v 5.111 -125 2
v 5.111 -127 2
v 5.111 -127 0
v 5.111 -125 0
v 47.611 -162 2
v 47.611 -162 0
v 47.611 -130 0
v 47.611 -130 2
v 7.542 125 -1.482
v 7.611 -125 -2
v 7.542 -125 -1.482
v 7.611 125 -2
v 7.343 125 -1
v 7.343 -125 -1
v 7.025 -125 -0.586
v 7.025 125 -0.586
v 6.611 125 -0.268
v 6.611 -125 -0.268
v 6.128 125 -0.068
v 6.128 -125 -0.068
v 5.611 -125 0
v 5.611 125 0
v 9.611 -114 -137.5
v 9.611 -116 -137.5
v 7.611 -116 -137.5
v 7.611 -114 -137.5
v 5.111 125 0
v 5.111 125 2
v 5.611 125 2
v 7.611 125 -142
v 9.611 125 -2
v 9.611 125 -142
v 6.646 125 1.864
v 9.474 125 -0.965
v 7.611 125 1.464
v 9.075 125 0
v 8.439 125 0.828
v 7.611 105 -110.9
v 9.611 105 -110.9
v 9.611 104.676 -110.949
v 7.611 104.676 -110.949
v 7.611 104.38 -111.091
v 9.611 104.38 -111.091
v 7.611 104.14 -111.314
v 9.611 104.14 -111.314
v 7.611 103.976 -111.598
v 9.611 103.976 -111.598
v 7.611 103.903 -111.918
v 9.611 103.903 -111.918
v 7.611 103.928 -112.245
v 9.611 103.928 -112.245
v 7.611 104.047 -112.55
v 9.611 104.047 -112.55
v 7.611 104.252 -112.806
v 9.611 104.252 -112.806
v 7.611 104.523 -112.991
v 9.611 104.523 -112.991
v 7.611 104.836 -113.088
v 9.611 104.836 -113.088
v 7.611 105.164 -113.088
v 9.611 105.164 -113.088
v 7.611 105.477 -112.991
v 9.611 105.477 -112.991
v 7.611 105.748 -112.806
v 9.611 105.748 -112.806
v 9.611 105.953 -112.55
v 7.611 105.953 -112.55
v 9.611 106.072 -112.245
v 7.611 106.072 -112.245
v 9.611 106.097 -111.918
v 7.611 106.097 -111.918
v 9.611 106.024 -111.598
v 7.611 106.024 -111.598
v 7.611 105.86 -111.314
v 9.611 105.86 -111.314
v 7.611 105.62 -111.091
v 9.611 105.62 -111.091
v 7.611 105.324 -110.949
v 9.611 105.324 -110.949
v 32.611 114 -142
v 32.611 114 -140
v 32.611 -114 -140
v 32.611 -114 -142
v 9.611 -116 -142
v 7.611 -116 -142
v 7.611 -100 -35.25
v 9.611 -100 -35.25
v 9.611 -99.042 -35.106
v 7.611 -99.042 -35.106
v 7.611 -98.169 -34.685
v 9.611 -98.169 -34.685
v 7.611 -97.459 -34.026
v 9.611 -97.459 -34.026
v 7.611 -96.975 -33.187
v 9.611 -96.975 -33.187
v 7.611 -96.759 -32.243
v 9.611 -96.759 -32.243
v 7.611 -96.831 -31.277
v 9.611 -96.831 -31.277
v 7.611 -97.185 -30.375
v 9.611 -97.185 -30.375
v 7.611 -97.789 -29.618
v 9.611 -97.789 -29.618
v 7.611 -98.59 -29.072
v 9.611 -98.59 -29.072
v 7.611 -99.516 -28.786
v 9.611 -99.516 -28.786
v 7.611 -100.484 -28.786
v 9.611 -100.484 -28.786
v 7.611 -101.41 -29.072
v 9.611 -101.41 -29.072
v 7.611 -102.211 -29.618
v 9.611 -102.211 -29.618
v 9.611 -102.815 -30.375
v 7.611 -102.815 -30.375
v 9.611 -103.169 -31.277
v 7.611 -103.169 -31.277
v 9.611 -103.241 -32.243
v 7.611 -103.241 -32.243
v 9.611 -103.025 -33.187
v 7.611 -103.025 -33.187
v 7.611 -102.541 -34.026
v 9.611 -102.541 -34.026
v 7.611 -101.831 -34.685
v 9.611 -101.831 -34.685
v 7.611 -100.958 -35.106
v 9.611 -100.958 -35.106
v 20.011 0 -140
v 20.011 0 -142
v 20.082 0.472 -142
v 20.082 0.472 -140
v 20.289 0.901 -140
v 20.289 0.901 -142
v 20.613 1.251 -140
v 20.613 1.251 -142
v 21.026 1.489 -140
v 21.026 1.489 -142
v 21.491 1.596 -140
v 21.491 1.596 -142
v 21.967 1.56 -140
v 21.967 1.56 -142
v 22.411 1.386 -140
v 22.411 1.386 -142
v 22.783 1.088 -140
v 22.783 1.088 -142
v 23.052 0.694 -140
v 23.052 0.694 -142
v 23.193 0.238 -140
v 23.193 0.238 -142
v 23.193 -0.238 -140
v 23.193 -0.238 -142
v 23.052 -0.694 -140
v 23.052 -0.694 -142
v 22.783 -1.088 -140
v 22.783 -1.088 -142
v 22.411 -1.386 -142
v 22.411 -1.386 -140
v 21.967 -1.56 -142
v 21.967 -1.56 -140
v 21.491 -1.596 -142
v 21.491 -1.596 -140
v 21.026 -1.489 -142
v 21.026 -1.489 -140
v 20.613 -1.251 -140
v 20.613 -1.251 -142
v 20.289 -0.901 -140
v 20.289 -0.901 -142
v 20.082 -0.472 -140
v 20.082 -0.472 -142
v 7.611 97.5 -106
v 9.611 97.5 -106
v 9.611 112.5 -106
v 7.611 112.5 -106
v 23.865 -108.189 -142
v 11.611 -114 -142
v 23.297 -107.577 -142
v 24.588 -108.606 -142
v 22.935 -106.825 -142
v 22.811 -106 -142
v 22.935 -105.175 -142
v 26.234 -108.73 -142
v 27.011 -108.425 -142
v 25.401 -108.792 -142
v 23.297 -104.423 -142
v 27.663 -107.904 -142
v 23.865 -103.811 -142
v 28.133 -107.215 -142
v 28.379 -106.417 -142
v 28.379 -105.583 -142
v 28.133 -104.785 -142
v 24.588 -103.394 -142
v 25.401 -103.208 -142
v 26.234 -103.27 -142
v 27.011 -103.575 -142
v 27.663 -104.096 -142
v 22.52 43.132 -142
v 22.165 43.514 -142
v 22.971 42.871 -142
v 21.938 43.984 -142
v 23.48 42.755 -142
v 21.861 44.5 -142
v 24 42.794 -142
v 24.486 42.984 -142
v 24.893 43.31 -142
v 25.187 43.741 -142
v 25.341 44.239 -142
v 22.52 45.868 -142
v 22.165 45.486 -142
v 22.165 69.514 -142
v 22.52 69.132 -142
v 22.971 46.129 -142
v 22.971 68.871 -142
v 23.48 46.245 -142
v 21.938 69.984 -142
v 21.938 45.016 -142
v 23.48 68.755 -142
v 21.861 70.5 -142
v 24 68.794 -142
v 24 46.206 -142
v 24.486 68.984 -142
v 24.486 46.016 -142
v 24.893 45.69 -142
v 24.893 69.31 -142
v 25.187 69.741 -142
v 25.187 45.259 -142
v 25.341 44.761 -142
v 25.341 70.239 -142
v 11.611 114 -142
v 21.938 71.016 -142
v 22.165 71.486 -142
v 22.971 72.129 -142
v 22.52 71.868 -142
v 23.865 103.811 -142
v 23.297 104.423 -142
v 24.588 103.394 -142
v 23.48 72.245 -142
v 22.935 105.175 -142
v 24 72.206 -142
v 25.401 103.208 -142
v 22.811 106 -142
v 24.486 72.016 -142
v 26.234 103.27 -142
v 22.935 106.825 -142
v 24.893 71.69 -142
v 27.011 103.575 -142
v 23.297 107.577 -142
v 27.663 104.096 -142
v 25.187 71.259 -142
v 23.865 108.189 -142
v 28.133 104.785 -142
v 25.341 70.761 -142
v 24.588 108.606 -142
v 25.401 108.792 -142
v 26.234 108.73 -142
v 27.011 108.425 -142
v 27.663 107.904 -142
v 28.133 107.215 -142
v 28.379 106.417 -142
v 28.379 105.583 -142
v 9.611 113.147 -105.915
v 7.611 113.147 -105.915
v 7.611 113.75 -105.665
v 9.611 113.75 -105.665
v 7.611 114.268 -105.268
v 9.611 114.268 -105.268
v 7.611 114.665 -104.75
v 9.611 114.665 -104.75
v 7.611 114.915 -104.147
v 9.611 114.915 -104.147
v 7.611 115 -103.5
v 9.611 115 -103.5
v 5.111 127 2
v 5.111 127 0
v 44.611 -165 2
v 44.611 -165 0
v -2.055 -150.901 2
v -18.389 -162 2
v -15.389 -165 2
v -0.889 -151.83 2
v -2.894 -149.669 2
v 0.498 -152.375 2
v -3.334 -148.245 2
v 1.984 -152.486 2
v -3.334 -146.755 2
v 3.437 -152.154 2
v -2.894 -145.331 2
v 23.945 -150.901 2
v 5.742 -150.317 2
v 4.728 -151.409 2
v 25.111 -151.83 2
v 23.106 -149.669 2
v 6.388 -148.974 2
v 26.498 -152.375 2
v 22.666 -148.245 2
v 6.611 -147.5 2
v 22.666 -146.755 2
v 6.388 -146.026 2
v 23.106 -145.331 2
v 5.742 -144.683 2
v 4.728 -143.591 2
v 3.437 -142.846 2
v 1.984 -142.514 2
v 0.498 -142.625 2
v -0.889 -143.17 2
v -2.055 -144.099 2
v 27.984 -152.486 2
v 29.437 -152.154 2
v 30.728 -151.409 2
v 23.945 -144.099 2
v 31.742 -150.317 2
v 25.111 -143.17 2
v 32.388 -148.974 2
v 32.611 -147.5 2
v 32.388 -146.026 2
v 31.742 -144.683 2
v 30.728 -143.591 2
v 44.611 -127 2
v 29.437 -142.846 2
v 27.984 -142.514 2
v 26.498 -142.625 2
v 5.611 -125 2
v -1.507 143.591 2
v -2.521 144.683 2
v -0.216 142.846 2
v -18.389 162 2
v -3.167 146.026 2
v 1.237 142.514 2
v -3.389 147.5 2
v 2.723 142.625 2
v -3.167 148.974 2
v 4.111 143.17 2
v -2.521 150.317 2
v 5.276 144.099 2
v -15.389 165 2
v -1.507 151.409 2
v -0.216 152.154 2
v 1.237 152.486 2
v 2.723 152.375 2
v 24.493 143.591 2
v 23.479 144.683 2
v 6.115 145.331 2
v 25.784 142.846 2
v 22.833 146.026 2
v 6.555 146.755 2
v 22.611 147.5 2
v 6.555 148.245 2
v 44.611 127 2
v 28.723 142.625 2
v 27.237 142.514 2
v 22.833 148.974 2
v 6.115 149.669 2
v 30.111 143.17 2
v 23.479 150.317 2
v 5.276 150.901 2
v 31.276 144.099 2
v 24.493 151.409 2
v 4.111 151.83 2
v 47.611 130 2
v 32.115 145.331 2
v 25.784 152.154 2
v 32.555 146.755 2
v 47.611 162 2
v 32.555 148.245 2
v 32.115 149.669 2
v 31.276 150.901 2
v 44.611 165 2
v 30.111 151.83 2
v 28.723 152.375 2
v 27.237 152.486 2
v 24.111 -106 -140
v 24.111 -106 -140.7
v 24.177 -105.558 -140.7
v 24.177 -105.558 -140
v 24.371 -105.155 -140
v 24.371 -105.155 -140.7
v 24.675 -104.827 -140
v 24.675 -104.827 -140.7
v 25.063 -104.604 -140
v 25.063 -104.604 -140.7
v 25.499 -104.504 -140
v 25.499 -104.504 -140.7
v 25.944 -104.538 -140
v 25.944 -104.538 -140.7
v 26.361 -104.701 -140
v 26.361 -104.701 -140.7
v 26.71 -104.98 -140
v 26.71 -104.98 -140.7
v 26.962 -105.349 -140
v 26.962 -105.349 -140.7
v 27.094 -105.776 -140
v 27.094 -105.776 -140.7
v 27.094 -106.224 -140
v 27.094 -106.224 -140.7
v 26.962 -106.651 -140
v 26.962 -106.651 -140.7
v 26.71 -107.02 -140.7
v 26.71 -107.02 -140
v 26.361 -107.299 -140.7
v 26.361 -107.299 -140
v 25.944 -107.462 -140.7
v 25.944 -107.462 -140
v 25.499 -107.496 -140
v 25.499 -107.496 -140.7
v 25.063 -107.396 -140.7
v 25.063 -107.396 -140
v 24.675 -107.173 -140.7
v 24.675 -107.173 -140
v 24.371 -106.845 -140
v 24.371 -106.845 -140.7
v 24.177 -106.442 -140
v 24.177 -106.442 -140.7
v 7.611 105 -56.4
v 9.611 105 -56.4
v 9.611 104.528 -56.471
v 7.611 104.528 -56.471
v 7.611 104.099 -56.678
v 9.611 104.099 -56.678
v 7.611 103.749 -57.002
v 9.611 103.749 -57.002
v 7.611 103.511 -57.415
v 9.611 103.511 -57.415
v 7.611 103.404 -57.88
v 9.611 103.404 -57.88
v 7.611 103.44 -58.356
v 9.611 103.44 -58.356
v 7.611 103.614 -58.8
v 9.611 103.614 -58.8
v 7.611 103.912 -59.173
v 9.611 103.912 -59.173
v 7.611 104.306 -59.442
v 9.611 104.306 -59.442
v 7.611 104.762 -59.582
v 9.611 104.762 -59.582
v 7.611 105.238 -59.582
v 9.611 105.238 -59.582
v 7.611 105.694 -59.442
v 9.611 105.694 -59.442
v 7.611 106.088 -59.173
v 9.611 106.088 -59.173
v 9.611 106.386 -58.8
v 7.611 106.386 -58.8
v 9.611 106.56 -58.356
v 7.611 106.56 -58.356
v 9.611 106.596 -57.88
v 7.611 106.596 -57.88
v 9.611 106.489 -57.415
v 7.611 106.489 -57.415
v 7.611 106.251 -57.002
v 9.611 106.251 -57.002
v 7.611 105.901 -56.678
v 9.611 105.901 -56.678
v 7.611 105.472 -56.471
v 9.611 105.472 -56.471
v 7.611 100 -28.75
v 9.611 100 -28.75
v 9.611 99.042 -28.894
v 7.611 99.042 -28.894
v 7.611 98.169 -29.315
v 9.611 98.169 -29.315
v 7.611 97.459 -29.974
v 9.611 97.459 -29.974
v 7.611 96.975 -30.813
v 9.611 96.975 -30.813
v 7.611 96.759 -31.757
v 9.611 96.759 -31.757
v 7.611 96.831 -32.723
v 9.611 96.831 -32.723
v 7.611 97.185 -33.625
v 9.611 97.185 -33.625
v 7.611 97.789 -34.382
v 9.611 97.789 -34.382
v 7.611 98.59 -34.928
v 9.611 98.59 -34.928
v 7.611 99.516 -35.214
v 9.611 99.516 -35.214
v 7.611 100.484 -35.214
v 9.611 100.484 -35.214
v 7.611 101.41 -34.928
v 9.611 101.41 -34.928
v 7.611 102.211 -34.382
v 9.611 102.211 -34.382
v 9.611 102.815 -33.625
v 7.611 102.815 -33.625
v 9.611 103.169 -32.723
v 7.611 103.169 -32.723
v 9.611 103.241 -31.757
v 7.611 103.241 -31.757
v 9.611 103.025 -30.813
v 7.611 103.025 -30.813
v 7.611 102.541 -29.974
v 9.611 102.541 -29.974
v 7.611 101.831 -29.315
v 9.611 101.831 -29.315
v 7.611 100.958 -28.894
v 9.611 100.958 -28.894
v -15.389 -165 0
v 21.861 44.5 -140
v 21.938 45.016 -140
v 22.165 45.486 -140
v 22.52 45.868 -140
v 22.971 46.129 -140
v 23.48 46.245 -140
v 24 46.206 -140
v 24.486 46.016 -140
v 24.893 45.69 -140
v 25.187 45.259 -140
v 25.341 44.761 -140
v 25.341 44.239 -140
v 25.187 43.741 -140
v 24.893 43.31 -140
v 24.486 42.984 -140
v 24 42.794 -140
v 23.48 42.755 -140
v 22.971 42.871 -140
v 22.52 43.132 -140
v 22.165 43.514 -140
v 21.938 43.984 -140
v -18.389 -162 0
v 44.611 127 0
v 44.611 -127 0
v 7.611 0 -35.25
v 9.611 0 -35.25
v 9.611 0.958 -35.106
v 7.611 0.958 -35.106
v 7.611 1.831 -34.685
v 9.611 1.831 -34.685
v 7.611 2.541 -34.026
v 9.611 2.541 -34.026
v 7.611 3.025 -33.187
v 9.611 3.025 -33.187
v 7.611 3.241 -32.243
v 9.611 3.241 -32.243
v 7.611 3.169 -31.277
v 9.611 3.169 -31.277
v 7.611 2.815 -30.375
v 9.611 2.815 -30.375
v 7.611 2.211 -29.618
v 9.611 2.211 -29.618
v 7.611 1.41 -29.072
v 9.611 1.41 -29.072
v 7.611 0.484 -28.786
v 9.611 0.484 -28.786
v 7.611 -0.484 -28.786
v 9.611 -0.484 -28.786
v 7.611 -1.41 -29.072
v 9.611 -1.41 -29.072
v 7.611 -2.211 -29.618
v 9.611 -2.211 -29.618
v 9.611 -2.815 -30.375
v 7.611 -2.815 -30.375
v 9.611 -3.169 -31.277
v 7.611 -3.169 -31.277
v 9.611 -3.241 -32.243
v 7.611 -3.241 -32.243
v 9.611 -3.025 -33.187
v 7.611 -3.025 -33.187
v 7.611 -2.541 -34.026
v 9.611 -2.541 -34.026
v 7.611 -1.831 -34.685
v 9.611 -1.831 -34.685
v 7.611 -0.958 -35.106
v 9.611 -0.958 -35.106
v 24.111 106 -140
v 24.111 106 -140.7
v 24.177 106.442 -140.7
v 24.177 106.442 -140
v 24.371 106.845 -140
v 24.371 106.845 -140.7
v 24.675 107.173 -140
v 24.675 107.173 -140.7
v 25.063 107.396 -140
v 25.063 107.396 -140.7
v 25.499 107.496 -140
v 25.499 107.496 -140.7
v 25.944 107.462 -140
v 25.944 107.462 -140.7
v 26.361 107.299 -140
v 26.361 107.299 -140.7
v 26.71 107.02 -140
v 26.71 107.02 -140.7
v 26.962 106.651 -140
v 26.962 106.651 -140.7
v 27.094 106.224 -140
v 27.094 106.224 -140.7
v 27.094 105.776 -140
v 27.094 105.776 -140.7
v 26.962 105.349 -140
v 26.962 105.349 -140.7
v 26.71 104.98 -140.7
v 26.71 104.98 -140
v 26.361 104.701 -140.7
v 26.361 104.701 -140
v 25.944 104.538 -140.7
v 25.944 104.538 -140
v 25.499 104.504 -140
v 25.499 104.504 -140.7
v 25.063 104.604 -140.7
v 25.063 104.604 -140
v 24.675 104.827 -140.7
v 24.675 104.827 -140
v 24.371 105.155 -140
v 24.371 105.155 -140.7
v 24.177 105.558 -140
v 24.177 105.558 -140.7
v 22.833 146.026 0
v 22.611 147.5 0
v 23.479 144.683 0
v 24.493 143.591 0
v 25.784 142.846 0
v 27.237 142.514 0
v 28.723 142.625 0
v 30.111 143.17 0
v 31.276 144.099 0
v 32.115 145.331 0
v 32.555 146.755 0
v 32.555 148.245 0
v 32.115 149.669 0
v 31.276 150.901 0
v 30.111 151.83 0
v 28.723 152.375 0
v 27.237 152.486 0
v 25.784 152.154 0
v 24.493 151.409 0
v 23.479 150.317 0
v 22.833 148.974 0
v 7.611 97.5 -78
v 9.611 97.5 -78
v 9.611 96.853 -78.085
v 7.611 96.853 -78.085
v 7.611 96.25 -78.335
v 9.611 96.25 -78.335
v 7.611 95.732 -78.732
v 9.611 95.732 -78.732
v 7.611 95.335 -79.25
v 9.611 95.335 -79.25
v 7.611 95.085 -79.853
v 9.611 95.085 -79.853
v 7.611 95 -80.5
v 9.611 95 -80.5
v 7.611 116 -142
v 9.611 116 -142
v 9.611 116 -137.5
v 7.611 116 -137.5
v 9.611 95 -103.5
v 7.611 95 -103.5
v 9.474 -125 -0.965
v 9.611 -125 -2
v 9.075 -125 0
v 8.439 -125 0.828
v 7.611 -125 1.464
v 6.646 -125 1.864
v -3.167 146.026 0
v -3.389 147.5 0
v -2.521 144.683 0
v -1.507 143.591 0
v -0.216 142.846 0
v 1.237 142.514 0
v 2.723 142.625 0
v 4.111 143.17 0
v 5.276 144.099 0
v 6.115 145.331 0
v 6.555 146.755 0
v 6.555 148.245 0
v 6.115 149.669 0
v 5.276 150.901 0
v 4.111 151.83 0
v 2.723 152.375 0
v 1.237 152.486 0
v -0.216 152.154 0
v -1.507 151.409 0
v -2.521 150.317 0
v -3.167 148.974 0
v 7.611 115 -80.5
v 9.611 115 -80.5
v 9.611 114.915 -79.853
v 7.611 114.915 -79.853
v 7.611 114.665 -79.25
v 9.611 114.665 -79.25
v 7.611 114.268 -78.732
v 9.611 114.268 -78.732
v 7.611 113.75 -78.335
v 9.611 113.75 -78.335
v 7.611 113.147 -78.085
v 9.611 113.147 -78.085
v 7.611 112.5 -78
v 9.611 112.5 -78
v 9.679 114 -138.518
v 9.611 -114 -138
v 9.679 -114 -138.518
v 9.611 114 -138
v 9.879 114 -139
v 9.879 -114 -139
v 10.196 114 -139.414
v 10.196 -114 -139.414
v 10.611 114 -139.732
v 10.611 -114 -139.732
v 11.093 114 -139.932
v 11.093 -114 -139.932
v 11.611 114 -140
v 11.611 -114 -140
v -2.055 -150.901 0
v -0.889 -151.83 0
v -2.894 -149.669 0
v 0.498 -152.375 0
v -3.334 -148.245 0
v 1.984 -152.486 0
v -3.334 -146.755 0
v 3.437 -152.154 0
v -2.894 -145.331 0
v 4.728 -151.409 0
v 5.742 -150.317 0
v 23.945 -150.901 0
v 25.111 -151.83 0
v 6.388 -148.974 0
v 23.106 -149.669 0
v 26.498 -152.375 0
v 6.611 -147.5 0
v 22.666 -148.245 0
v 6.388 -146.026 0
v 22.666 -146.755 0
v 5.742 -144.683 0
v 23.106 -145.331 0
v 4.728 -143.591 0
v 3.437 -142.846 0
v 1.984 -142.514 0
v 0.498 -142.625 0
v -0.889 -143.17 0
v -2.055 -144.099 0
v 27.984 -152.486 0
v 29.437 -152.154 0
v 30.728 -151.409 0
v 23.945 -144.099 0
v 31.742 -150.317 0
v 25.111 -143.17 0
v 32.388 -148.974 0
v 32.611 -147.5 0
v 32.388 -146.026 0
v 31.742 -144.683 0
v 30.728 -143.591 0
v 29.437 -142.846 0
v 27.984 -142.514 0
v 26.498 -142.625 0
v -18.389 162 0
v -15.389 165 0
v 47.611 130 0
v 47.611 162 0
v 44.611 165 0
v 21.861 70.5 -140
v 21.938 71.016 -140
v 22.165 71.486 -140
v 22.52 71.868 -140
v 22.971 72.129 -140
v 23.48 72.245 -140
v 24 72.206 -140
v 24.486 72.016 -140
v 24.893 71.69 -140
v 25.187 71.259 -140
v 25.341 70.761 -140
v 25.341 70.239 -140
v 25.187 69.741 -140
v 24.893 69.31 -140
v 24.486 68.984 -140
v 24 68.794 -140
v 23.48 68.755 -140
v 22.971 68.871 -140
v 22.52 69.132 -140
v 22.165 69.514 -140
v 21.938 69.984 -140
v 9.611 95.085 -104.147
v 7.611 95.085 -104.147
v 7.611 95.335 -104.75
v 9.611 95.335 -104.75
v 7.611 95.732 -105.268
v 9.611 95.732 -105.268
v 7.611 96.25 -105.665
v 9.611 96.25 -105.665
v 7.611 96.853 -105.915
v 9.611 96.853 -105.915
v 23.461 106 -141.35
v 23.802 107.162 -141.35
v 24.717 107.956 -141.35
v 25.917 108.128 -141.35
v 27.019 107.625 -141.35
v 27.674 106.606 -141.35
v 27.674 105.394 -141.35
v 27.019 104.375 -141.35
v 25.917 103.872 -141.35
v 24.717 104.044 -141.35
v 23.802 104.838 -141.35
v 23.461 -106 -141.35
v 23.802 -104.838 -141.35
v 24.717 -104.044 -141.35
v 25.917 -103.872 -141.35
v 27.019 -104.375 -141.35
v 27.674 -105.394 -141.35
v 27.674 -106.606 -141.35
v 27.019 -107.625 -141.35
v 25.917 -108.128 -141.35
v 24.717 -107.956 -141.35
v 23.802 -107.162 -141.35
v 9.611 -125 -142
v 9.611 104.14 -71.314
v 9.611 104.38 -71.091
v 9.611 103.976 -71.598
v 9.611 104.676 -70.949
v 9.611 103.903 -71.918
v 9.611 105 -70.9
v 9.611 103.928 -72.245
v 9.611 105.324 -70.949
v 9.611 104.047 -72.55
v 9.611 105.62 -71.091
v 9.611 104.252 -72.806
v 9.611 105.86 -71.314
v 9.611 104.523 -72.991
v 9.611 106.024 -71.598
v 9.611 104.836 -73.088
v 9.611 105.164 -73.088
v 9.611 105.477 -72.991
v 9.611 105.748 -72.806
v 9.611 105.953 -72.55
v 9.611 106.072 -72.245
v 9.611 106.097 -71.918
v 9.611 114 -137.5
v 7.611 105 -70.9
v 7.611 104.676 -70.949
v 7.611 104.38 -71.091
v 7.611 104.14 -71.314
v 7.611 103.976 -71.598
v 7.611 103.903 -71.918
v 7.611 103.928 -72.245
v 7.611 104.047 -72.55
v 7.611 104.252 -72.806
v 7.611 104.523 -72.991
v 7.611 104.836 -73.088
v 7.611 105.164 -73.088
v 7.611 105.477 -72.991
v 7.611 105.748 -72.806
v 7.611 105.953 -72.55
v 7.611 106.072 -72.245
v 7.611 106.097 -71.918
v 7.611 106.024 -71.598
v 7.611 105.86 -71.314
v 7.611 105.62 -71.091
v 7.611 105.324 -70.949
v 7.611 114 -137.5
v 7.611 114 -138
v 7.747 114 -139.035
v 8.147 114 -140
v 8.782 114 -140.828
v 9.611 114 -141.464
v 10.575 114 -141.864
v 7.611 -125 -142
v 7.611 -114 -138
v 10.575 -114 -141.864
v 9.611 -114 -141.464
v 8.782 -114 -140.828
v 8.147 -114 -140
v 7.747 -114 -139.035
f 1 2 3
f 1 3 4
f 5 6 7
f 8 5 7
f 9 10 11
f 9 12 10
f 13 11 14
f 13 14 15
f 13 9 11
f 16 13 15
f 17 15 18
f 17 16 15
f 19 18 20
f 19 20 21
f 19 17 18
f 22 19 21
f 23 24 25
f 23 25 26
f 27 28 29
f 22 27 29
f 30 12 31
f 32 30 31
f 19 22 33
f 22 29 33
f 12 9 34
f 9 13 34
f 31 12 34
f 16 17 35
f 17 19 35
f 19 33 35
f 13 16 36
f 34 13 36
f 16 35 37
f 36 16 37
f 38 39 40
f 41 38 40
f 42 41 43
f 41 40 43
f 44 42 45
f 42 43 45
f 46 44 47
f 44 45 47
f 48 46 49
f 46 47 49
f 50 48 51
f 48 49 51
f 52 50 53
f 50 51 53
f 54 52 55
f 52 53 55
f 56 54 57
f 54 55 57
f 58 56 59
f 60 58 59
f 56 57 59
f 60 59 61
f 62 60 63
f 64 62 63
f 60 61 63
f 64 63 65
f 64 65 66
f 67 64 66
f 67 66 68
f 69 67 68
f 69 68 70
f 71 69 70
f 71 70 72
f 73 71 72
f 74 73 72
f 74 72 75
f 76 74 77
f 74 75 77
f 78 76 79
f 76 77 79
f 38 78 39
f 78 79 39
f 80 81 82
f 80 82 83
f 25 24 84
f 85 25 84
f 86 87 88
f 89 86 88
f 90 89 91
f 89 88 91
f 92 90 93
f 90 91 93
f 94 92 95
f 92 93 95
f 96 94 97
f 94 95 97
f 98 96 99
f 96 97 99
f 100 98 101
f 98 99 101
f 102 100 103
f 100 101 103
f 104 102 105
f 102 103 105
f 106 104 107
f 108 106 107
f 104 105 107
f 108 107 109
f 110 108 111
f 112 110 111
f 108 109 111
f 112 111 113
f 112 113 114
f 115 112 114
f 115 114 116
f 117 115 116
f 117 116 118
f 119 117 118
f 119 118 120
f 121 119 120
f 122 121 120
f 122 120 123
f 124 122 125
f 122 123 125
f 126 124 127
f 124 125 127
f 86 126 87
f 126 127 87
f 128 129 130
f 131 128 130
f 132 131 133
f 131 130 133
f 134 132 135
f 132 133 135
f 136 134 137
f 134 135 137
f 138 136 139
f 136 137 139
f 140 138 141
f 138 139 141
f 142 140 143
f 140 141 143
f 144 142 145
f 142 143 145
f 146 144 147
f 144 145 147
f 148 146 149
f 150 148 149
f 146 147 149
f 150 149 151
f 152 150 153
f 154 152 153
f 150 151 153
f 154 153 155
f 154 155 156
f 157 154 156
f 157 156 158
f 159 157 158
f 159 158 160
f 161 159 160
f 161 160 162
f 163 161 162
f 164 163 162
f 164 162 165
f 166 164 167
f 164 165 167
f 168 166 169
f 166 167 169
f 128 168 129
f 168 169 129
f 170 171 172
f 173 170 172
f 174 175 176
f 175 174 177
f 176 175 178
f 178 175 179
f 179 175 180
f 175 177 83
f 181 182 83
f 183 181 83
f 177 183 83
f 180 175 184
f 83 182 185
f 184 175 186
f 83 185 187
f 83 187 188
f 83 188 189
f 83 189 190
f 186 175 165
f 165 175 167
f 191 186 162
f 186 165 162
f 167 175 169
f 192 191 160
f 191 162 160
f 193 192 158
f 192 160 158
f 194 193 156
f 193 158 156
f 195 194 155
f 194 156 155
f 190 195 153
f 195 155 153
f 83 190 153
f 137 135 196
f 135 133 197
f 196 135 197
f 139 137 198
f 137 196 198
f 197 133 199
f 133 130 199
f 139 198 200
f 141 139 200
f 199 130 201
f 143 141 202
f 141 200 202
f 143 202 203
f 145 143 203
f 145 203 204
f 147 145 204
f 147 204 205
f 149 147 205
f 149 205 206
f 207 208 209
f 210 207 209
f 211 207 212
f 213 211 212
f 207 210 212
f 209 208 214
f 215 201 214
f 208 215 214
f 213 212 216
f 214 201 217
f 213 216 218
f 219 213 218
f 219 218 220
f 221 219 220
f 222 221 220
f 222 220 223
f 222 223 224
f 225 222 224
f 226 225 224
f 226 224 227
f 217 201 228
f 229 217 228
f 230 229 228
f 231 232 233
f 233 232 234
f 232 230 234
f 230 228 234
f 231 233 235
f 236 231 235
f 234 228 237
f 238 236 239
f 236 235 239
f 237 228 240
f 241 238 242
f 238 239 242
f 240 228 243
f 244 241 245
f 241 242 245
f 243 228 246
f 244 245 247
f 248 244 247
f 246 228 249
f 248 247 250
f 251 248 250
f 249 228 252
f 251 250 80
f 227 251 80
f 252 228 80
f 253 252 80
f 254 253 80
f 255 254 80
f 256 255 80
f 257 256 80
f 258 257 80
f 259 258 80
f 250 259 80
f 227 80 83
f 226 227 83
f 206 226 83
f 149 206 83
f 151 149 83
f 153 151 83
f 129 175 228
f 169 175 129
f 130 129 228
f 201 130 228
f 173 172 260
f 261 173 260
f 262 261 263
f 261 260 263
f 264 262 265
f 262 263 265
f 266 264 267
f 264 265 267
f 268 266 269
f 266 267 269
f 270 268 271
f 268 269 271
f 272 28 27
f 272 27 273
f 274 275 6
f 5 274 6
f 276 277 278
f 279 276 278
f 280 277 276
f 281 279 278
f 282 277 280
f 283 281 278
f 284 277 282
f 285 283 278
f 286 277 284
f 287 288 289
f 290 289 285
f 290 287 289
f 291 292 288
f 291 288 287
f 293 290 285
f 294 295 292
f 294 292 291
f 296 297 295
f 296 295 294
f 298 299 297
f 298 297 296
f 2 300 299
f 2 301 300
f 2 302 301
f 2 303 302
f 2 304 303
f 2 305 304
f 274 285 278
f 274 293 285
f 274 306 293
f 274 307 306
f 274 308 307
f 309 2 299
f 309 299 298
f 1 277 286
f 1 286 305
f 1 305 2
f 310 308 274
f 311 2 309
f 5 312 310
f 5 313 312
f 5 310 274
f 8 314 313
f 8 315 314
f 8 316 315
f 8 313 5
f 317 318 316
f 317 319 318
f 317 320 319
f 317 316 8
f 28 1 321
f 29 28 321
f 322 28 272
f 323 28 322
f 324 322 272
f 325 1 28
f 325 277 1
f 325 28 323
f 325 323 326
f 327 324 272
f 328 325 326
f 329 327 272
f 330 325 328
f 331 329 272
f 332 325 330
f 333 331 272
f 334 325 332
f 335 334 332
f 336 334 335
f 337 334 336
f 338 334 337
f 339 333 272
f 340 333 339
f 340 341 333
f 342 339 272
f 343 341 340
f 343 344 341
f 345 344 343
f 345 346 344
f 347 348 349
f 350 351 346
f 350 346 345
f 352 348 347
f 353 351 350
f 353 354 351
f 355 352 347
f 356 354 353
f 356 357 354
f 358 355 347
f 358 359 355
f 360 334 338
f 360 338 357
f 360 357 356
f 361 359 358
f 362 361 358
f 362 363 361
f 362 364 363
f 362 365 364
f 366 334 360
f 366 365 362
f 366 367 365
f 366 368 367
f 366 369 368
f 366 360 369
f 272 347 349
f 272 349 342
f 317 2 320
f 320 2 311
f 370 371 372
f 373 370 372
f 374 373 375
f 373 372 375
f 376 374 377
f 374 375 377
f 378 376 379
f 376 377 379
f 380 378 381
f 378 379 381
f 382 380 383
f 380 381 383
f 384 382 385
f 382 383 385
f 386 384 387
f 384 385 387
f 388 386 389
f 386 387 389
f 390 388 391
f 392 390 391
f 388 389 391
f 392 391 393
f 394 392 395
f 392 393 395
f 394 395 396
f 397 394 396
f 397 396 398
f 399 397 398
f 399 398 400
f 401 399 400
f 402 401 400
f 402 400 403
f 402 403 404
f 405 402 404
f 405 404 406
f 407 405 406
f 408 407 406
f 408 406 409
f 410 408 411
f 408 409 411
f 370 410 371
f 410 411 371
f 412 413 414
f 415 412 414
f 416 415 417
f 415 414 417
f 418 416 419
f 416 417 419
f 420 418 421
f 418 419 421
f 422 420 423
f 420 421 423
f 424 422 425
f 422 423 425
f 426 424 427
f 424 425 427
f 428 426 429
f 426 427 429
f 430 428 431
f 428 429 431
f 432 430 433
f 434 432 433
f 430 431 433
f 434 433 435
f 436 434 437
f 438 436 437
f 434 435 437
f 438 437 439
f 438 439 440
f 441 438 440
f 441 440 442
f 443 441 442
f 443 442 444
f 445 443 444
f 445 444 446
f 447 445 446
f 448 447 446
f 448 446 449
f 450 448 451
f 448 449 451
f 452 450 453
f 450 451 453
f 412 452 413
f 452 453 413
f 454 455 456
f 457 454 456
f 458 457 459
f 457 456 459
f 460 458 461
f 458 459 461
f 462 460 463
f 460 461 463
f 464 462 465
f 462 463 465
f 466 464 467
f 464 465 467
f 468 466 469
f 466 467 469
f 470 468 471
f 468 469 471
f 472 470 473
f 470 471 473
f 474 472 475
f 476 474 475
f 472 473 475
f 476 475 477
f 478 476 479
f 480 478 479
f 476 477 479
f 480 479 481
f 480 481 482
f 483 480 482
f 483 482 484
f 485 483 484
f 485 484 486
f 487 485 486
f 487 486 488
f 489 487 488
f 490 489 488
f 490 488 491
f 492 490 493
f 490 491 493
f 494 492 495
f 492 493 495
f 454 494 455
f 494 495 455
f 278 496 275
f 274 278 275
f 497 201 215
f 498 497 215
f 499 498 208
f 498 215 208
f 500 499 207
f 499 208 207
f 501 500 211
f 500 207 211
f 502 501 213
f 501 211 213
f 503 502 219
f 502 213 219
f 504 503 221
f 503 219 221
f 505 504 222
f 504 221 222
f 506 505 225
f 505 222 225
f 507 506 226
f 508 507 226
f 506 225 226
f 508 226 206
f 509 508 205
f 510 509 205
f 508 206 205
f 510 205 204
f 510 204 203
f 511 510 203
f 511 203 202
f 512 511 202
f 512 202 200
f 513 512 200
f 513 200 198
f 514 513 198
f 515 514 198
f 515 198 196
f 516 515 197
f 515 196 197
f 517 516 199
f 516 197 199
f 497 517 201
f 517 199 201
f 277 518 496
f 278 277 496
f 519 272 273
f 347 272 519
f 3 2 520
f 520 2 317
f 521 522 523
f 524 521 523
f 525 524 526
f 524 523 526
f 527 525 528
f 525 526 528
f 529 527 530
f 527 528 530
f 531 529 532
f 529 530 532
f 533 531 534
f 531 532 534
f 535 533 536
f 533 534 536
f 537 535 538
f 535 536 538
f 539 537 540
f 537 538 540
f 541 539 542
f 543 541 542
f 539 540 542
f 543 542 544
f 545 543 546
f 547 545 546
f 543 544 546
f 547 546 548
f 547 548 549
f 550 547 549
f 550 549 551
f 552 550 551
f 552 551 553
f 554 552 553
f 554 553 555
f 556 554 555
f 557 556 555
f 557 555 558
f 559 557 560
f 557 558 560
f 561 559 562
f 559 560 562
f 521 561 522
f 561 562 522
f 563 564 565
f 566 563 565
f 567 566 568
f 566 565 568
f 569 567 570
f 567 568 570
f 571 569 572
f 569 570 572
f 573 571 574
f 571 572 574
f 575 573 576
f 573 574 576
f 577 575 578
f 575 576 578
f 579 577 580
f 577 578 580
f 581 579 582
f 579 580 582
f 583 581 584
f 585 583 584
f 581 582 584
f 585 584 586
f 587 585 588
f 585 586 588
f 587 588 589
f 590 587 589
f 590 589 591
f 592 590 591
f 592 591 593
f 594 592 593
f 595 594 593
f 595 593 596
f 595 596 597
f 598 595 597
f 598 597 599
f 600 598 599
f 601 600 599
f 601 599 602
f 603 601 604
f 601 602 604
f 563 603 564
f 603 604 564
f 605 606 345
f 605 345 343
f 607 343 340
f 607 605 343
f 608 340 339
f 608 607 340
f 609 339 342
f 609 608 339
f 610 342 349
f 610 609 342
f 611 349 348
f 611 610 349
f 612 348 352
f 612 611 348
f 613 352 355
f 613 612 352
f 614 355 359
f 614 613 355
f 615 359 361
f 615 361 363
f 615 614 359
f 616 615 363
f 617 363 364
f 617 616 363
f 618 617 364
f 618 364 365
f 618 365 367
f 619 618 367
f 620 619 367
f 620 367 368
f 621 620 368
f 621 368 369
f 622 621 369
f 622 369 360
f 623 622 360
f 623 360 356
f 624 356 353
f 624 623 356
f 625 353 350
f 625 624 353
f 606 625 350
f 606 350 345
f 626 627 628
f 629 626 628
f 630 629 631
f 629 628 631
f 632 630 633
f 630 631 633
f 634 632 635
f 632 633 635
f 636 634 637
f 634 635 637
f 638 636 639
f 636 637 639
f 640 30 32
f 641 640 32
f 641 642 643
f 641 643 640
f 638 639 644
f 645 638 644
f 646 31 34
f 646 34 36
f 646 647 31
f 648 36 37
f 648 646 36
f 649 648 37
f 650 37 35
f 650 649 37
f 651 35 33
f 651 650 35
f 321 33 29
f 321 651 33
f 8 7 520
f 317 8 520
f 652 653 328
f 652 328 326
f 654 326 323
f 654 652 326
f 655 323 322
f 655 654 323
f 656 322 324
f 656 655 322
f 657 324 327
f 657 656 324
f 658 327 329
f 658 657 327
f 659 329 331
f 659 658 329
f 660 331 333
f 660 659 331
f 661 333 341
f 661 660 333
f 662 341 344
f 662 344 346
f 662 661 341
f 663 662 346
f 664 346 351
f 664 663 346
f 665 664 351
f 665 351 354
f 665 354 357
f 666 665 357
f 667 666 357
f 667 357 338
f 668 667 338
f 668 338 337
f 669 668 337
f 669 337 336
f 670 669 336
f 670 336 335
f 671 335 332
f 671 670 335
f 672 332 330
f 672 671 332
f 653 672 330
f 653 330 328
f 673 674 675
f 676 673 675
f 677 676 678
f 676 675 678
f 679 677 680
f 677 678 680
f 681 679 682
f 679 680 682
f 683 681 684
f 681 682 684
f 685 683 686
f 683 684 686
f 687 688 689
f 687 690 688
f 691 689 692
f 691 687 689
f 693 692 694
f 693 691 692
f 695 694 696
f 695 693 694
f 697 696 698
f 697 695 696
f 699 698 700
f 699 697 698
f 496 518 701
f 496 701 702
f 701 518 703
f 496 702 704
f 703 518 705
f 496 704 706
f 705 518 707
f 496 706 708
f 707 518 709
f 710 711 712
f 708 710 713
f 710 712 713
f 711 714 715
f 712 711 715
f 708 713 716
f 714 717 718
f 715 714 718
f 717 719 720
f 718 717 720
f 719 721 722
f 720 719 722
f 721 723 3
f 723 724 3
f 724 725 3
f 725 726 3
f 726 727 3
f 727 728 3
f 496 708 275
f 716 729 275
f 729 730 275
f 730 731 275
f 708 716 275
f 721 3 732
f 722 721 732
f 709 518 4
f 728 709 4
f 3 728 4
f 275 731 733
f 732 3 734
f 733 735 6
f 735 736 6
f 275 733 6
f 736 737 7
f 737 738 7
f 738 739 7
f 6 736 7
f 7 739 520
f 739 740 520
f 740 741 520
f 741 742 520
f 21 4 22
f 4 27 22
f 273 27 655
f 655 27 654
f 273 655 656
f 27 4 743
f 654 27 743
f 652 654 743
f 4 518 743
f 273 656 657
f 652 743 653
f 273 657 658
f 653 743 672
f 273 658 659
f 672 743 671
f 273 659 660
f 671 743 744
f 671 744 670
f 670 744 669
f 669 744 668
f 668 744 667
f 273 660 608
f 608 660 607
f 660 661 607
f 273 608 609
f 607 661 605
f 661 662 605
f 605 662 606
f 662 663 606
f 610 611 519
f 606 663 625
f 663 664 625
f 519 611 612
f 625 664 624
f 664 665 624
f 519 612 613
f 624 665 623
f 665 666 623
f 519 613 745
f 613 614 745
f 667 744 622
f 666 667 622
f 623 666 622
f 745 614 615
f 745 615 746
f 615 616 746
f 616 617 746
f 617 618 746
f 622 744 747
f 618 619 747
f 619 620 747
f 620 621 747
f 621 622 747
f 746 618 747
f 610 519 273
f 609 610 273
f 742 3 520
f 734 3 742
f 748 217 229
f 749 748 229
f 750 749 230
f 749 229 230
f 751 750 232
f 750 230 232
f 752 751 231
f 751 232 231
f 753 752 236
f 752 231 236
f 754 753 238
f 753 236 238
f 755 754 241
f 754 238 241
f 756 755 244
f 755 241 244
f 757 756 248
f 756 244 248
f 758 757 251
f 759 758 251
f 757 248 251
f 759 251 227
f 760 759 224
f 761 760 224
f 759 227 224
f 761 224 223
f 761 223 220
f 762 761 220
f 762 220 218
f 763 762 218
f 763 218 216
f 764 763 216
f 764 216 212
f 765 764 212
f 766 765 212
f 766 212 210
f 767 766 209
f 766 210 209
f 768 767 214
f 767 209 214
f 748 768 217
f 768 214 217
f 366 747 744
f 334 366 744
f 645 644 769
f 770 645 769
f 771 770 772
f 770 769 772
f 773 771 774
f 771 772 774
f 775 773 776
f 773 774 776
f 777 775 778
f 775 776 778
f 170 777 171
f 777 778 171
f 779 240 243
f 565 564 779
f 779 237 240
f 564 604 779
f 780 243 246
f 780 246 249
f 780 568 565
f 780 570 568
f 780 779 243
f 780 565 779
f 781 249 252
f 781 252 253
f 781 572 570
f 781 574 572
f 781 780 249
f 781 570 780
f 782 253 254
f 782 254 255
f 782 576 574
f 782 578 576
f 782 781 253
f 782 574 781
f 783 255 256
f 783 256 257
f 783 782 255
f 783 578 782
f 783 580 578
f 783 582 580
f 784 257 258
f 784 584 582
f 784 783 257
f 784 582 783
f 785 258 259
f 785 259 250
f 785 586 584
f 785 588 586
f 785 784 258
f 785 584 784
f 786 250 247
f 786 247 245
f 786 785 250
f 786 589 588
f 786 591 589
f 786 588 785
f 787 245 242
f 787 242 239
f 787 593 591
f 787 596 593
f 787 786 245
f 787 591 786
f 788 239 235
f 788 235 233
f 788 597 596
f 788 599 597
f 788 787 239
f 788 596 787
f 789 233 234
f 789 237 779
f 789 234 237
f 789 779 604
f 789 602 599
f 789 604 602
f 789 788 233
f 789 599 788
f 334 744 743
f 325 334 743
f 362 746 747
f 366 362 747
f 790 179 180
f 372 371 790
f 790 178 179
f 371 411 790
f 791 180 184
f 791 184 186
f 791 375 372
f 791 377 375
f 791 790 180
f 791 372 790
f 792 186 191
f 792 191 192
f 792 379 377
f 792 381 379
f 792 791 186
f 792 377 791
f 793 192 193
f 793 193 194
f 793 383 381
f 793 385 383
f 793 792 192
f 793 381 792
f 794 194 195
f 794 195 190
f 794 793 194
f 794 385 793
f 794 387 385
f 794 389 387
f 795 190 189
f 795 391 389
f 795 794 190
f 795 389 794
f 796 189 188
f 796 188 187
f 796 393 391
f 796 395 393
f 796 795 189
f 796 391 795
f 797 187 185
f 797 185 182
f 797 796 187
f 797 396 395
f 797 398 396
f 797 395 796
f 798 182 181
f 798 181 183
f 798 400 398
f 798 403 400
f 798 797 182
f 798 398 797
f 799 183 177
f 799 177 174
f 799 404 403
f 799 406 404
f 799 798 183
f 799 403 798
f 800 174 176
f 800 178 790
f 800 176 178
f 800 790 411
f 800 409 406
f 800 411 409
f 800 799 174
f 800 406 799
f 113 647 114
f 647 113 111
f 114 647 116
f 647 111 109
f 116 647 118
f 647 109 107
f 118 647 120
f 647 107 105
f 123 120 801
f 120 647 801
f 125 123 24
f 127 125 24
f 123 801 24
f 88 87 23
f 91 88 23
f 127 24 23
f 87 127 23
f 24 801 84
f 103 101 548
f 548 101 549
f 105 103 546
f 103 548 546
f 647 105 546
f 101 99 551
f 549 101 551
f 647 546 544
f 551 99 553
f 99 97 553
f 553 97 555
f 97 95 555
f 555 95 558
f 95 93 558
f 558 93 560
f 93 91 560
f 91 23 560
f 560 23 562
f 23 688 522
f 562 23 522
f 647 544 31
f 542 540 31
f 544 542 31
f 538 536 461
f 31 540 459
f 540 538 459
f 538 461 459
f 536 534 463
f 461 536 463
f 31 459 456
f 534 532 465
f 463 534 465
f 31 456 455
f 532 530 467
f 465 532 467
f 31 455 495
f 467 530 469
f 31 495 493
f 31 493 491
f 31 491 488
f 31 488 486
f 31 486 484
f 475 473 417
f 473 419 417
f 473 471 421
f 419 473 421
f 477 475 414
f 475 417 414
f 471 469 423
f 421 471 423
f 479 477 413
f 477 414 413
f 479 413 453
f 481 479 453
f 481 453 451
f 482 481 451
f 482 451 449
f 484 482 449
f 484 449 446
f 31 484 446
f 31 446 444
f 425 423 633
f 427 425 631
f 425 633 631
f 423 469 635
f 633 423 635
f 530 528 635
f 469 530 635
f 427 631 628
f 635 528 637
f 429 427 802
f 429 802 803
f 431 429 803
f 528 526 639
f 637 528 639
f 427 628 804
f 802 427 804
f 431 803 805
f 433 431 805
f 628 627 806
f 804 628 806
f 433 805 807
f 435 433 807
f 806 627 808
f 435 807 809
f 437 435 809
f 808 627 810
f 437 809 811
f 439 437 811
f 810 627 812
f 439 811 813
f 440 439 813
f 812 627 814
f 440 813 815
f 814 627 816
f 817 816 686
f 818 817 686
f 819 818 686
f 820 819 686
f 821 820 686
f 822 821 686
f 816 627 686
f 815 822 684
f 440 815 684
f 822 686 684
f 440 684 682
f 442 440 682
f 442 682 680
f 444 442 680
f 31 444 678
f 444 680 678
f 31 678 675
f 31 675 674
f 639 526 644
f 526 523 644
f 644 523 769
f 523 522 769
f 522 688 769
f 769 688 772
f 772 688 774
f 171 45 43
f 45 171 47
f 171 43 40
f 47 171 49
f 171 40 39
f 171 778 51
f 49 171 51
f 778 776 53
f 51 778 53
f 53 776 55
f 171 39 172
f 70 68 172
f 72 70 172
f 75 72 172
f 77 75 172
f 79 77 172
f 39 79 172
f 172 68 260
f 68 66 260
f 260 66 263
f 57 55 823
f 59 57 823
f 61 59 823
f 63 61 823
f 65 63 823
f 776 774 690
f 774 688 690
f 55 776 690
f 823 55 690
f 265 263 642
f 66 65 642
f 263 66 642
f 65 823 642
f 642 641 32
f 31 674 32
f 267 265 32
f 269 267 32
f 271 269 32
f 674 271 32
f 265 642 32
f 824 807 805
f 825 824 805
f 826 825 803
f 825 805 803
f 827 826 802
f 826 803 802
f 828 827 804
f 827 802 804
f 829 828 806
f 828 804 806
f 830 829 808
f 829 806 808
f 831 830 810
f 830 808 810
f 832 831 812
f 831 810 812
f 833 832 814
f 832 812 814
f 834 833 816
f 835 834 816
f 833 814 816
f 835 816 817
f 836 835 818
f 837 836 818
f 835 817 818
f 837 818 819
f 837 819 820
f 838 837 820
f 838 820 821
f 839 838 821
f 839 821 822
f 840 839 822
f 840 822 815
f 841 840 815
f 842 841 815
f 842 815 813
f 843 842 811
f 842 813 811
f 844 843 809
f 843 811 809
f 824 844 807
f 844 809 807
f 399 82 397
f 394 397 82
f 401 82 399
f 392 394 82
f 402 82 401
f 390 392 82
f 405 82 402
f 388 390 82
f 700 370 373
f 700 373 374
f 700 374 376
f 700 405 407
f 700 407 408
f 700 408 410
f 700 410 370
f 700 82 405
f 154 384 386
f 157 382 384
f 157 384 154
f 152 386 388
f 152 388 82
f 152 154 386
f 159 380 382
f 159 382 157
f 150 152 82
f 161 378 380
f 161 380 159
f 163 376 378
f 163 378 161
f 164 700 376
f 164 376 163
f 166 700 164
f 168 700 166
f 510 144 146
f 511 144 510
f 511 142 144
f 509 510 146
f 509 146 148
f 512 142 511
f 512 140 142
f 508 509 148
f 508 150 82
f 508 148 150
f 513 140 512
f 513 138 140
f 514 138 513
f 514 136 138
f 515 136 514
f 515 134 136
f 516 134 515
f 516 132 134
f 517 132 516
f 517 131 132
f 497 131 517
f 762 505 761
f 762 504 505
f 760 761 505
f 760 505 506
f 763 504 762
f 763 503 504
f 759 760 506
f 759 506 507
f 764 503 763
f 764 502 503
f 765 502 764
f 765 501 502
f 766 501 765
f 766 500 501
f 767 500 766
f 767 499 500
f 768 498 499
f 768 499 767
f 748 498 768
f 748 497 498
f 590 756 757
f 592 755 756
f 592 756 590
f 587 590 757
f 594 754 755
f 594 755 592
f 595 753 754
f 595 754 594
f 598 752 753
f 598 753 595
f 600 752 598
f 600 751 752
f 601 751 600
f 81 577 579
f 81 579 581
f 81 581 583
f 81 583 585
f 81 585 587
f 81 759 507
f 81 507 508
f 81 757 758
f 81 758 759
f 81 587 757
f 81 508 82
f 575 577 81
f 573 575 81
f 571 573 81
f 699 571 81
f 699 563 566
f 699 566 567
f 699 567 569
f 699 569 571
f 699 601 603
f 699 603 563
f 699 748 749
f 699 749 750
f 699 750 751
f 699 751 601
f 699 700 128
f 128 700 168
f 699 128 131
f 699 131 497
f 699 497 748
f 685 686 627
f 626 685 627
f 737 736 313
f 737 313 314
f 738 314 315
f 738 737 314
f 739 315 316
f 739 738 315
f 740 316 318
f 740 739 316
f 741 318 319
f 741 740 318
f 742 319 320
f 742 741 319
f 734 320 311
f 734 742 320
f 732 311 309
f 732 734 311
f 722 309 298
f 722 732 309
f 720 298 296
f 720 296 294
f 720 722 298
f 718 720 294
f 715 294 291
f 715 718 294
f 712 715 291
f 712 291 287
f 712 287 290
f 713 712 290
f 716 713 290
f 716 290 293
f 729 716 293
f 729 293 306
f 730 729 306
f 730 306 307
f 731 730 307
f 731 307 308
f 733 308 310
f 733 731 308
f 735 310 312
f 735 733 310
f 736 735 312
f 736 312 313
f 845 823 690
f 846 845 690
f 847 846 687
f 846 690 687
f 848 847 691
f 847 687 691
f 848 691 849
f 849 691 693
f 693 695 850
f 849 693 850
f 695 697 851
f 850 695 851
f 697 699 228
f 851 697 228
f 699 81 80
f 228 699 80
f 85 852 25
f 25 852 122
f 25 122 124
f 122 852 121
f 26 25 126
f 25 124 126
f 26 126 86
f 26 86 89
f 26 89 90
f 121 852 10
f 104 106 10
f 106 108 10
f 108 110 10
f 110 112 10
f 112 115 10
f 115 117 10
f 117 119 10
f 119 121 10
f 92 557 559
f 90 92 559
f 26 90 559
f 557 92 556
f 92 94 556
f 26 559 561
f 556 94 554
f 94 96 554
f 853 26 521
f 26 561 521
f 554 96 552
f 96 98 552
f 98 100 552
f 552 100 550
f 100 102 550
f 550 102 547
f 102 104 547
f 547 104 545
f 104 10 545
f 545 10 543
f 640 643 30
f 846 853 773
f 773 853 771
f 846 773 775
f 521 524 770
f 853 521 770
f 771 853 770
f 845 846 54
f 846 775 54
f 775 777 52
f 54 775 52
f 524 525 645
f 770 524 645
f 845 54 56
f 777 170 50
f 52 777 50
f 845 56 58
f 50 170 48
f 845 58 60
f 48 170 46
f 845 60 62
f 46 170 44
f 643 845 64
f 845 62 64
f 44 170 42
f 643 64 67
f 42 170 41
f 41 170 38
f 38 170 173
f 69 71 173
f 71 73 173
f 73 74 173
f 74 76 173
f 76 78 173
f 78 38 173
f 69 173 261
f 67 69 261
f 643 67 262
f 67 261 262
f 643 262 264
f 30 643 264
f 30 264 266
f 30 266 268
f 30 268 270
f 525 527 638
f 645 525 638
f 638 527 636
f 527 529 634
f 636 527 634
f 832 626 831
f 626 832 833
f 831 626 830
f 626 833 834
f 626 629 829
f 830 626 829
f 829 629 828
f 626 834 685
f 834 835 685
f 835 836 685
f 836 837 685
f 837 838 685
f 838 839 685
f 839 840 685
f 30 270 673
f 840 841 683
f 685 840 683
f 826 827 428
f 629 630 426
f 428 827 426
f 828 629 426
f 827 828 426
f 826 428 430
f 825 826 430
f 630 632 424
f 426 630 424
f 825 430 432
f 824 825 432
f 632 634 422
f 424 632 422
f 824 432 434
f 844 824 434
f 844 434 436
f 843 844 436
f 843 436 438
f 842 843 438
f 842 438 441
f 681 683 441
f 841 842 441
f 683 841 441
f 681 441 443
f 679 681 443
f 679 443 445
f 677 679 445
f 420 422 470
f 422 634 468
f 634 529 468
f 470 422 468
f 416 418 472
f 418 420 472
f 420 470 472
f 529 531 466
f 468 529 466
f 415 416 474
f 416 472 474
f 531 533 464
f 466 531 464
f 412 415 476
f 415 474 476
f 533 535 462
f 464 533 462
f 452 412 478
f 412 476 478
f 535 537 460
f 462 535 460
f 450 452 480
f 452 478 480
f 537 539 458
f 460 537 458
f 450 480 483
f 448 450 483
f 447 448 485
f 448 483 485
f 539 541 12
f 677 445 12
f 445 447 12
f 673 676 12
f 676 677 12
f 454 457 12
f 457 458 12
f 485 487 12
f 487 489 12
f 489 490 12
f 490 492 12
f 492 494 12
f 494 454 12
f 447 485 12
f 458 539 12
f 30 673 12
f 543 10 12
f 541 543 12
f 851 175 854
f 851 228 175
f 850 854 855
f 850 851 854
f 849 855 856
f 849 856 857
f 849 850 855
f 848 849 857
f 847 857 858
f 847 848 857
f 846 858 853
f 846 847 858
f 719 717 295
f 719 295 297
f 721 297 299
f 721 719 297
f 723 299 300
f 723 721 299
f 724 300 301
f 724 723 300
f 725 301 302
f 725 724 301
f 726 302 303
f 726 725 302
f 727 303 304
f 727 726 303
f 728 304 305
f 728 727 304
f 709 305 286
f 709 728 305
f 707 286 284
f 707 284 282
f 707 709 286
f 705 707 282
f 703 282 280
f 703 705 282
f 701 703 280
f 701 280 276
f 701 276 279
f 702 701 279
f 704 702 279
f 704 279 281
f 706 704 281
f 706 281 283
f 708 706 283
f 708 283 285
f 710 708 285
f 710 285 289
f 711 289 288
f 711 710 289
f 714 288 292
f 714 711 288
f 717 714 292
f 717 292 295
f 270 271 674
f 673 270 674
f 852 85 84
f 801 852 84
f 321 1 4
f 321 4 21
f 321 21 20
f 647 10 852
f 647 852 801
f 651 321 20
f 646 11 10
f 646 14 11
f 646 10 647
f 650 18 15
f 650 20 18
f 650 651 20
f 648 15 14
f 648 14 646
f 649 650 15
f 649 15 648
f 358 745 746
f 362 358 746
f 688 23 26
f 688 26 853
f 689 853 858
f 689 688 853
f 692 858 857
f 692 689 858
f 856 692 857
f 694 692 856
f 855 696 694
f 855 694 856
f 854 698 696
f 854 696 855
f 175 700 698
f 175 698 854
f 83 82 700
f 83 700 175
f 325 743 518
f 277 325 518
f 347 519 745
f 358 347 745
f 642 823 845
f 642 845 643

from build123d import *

# Parameters (mm, degrees)
SKETCH_1_R          = 5
EXTRUDE_1_DEPTH     = 2
SKETCH_2_W          = 2
SKETCH_2_H          = 250
EXTRUDE_2_DEPTH     = 144
SKETCH_3_W          = 2
SKETCH_3_H          = 228
EXTRUDE_3_DEPTH     = 23
SKETCH_4_W          = 4.5
SKETCH_4_H          = 2
CUT_EXTRUDE_1_DEPTH = 2
SKETCH_5_W          = 4.5
SKETCH_5_H          = 2
CUT_EXTRUDE_2_DEPTH = 2
FILLET_3_R          = 2
FILLET_4_R          = 4
SKETCH_6_R          = 1.6
SKETCH_6_R_2        = 1.5
SKETCH_6_R_3        = 1.75
CUT_EXTRUDE_3_DEPTH = 2
CHAMFER_1_SIZE      = 1.3
SKETCH_8_R          = 3.25
SKETCH_8_R_2        = 1.1
SKETCH_8_R_3        = 1.6
CUT_EXTRUDE_4_DEPTH = 2


with BuildPart() as part:
    # Эскиз1 → Вытянуть1 (new body)
    with BuildSketch(Plane.XY):
        Polygon((-15.389384289, -165), (44.610615711, -165), (47.610615711, -162), (47.610615711, -130), (44.610615711, -127), (9.610615711, -127), (9.610615711, 127), (44.610615711, 127), (47.610615711, 130), (47.610615711, 162), (44.610615711, 165), (-15.389384289, 165), (-18.389384289, 162), (-18.389384289, -162), align=None)
        with Locations((1.610615711, -147.5)):
            Circle(SKETCH_1_R, mode=Mode.SUBTRACT)
        with Locations((27.610615711, -147.5)):
            Circle(SKETCH_1_R, mode=Mode.SUBTRACT)
        with Locations(Location((27.610615711, 147.5, 0), (0, 0, 180))):
            Circle(SKETCH_1_R, mode=Mode.SUBTRACT)
        with Locations(Location((1.610615711, 147.5, 0), (0, 0, 180))):
            Circle(SKETCH_1_R, mode=Mode.SUBTRACT)
    extrude(amount=EXTRUDE_1_DEPTH)

    # Эскиз2 → Вытянуть2 (add)
    with BuildSketch(Plane.XY.offset(2)):
        with Locations((8.610615711, 0)):
            Rectangle(SKETCH_2_W, SKETCH_2_H)
    extrude(amount=-EXTRUDE_2_DEPTH)

    # Эскиз3 → Вытянуть3 (add)
    with BuildSketch(Plane(origin=(9.610615711, 0, 0), x_dir=(0, 0, -1), z_dir=(1, 0, 0))):
        with Locations((141, 0)):
            Rectangle(SKETCH_3_W, SKETCH_3_H)
    extrude(amount=EXTRUDE_3_DEPTH)

    # Эскиз4 → Вырез-Вытянуть1 (cut)
    with BuildSketch(Plane.XY.offset(2)):
        with Locations((7.360615711, 126)):
            Rectangle(SKETCH_4_W, SKETCH_4_H)
        with Locations((7.360615711, -126)):
            Rectangle(SKETCH_4_W, SKETCH_4_H)
    extrude(amount=-CUT_EXTRUDE_1_DEPTH, mode=Mode.SUBTRACT)

    # Эскиз5 → Вырез-Вытянуть2 (cut)
    with BuildSketch(Plane(origin=(9.610615711, 0, 0), x_dir=(0, 0, -1), z_dir=(1, 0, 0))):
        with Locations((139.75, -115)):
            Rectangle(SKETCH_5_W, SKETCH_5_H)
        with Locations((139.75, 115)):
            Rectangle(SKETCH_5_W, SKETCH_5_H)
    extrude(amount=-CUT_EXTRUDE_2_DEPTH, mode=Mode.SUBTRACT)

    # Скругление3
    fillet_3_edges = [part.edges().sort_by_distance(p)[0] for p in [
        (9.610615711, 0, -140),
        (7.610615711, 0, 0),
    ]]
    fillet(fillet_3_edges, radius=FILLET_3_R)

    # Скругление4
    fillet_4_edges = [part.edges().sort_by_distance(p)[0] for p in [
        (7.610615711, 0, -142),
        (9.610615711, 0, 2),
    ]]
    fillet(fillet_4_edges, radius=FILLET_4_R)

    # Эскиз6 → Вырез-Вытянуть3 (cut)
    with BuildSketch(Plane(origin=(0, 0, -142), x_dir=(-1, 0, 0), z_dir=(0, 0, -1))):
        with Locations((-21.610615711, 0)):
            Circle(SKETCH_6_R)
        with Locations((-25.610615711, -106)):
            Circle(SKETCH_6_R_2)
        with Locations((-25.610615711, 106)):
            Circle(SKETCH_6_R_2)
        with Locations((-23.610615711, 44.5)):
            Circle(SKETCH_6_R_3)
        with Locations((-23.610615711, 70.5)):
            Circle(SKETCH_6_R_3)
    extrude(amount=-CUT_EXTRUDE_3_DEPTH, mode=Mode.SUBTRACT)

    # Фаска1
    chamfer_1_edges = [part.edges().sort_by_distance(p)[0] for p in [
        (27.110615711, -106, -142),
        (27.110615711, 106, -142),
    ]]
    chamfer(chamfer_1_edges, length=CHAMFER_1_SIZE)

    # Эскиз8 → Вырез-Вытянуть4 (cut)
    with BuildSketch(Plane(origin=(9.610615711, 0, 0), x_dir=(0, 0, -1), z_dir=(1, 0, 0))):
        with Locations((32, 0)):
            Circle(SKETCH_8_R)
        with Locations((32, -100)):
            Circle(SKETCH_8_R)
        with Locations(Location((32, 100, 0), (0, 0, 180))):
            Circle(SKETCH_8_R)
        with Locations(Location((112, 105, 0), (0, 0, 180))):
            Circle(SKETCH_8_R_2)
        with Locations(Location((72, 105, 0), (0, 0, 180))):
            Circle(SKETCH_8_R_2)
        with Locations(Location((58, 105, 0), (0, 0, 180))):
            Circle(SKETCH_8_R_3)
        with BuildLine():
            Line((80.5, 95), (103.5, 95))
            ThreePointArc((103.5, 95), (105.267766953, 95.732233047), (106, 97.5))
            Line((106, 97.5), (106, 112.5))
            ThreePointArc((106, 112.5), (105.267766953, 114.267766953), (103.5, 115))
            Line((103.5, 115), (80.5, 115))
            ThreePointArc((80.5, 115), (78.732233047, 114.267766953), (78, 112.5))
            Line((78, 112.5), (78, 97.5))
            ThreePointArc((78, 97.5), (78.732233047, 95.732233047), (80.5, 95))
        make_face()
    extrude(amount=-CUT_EXTRUDE_4_DEPTH, mode=Mode.SUBTRACT)


solid = part.part
